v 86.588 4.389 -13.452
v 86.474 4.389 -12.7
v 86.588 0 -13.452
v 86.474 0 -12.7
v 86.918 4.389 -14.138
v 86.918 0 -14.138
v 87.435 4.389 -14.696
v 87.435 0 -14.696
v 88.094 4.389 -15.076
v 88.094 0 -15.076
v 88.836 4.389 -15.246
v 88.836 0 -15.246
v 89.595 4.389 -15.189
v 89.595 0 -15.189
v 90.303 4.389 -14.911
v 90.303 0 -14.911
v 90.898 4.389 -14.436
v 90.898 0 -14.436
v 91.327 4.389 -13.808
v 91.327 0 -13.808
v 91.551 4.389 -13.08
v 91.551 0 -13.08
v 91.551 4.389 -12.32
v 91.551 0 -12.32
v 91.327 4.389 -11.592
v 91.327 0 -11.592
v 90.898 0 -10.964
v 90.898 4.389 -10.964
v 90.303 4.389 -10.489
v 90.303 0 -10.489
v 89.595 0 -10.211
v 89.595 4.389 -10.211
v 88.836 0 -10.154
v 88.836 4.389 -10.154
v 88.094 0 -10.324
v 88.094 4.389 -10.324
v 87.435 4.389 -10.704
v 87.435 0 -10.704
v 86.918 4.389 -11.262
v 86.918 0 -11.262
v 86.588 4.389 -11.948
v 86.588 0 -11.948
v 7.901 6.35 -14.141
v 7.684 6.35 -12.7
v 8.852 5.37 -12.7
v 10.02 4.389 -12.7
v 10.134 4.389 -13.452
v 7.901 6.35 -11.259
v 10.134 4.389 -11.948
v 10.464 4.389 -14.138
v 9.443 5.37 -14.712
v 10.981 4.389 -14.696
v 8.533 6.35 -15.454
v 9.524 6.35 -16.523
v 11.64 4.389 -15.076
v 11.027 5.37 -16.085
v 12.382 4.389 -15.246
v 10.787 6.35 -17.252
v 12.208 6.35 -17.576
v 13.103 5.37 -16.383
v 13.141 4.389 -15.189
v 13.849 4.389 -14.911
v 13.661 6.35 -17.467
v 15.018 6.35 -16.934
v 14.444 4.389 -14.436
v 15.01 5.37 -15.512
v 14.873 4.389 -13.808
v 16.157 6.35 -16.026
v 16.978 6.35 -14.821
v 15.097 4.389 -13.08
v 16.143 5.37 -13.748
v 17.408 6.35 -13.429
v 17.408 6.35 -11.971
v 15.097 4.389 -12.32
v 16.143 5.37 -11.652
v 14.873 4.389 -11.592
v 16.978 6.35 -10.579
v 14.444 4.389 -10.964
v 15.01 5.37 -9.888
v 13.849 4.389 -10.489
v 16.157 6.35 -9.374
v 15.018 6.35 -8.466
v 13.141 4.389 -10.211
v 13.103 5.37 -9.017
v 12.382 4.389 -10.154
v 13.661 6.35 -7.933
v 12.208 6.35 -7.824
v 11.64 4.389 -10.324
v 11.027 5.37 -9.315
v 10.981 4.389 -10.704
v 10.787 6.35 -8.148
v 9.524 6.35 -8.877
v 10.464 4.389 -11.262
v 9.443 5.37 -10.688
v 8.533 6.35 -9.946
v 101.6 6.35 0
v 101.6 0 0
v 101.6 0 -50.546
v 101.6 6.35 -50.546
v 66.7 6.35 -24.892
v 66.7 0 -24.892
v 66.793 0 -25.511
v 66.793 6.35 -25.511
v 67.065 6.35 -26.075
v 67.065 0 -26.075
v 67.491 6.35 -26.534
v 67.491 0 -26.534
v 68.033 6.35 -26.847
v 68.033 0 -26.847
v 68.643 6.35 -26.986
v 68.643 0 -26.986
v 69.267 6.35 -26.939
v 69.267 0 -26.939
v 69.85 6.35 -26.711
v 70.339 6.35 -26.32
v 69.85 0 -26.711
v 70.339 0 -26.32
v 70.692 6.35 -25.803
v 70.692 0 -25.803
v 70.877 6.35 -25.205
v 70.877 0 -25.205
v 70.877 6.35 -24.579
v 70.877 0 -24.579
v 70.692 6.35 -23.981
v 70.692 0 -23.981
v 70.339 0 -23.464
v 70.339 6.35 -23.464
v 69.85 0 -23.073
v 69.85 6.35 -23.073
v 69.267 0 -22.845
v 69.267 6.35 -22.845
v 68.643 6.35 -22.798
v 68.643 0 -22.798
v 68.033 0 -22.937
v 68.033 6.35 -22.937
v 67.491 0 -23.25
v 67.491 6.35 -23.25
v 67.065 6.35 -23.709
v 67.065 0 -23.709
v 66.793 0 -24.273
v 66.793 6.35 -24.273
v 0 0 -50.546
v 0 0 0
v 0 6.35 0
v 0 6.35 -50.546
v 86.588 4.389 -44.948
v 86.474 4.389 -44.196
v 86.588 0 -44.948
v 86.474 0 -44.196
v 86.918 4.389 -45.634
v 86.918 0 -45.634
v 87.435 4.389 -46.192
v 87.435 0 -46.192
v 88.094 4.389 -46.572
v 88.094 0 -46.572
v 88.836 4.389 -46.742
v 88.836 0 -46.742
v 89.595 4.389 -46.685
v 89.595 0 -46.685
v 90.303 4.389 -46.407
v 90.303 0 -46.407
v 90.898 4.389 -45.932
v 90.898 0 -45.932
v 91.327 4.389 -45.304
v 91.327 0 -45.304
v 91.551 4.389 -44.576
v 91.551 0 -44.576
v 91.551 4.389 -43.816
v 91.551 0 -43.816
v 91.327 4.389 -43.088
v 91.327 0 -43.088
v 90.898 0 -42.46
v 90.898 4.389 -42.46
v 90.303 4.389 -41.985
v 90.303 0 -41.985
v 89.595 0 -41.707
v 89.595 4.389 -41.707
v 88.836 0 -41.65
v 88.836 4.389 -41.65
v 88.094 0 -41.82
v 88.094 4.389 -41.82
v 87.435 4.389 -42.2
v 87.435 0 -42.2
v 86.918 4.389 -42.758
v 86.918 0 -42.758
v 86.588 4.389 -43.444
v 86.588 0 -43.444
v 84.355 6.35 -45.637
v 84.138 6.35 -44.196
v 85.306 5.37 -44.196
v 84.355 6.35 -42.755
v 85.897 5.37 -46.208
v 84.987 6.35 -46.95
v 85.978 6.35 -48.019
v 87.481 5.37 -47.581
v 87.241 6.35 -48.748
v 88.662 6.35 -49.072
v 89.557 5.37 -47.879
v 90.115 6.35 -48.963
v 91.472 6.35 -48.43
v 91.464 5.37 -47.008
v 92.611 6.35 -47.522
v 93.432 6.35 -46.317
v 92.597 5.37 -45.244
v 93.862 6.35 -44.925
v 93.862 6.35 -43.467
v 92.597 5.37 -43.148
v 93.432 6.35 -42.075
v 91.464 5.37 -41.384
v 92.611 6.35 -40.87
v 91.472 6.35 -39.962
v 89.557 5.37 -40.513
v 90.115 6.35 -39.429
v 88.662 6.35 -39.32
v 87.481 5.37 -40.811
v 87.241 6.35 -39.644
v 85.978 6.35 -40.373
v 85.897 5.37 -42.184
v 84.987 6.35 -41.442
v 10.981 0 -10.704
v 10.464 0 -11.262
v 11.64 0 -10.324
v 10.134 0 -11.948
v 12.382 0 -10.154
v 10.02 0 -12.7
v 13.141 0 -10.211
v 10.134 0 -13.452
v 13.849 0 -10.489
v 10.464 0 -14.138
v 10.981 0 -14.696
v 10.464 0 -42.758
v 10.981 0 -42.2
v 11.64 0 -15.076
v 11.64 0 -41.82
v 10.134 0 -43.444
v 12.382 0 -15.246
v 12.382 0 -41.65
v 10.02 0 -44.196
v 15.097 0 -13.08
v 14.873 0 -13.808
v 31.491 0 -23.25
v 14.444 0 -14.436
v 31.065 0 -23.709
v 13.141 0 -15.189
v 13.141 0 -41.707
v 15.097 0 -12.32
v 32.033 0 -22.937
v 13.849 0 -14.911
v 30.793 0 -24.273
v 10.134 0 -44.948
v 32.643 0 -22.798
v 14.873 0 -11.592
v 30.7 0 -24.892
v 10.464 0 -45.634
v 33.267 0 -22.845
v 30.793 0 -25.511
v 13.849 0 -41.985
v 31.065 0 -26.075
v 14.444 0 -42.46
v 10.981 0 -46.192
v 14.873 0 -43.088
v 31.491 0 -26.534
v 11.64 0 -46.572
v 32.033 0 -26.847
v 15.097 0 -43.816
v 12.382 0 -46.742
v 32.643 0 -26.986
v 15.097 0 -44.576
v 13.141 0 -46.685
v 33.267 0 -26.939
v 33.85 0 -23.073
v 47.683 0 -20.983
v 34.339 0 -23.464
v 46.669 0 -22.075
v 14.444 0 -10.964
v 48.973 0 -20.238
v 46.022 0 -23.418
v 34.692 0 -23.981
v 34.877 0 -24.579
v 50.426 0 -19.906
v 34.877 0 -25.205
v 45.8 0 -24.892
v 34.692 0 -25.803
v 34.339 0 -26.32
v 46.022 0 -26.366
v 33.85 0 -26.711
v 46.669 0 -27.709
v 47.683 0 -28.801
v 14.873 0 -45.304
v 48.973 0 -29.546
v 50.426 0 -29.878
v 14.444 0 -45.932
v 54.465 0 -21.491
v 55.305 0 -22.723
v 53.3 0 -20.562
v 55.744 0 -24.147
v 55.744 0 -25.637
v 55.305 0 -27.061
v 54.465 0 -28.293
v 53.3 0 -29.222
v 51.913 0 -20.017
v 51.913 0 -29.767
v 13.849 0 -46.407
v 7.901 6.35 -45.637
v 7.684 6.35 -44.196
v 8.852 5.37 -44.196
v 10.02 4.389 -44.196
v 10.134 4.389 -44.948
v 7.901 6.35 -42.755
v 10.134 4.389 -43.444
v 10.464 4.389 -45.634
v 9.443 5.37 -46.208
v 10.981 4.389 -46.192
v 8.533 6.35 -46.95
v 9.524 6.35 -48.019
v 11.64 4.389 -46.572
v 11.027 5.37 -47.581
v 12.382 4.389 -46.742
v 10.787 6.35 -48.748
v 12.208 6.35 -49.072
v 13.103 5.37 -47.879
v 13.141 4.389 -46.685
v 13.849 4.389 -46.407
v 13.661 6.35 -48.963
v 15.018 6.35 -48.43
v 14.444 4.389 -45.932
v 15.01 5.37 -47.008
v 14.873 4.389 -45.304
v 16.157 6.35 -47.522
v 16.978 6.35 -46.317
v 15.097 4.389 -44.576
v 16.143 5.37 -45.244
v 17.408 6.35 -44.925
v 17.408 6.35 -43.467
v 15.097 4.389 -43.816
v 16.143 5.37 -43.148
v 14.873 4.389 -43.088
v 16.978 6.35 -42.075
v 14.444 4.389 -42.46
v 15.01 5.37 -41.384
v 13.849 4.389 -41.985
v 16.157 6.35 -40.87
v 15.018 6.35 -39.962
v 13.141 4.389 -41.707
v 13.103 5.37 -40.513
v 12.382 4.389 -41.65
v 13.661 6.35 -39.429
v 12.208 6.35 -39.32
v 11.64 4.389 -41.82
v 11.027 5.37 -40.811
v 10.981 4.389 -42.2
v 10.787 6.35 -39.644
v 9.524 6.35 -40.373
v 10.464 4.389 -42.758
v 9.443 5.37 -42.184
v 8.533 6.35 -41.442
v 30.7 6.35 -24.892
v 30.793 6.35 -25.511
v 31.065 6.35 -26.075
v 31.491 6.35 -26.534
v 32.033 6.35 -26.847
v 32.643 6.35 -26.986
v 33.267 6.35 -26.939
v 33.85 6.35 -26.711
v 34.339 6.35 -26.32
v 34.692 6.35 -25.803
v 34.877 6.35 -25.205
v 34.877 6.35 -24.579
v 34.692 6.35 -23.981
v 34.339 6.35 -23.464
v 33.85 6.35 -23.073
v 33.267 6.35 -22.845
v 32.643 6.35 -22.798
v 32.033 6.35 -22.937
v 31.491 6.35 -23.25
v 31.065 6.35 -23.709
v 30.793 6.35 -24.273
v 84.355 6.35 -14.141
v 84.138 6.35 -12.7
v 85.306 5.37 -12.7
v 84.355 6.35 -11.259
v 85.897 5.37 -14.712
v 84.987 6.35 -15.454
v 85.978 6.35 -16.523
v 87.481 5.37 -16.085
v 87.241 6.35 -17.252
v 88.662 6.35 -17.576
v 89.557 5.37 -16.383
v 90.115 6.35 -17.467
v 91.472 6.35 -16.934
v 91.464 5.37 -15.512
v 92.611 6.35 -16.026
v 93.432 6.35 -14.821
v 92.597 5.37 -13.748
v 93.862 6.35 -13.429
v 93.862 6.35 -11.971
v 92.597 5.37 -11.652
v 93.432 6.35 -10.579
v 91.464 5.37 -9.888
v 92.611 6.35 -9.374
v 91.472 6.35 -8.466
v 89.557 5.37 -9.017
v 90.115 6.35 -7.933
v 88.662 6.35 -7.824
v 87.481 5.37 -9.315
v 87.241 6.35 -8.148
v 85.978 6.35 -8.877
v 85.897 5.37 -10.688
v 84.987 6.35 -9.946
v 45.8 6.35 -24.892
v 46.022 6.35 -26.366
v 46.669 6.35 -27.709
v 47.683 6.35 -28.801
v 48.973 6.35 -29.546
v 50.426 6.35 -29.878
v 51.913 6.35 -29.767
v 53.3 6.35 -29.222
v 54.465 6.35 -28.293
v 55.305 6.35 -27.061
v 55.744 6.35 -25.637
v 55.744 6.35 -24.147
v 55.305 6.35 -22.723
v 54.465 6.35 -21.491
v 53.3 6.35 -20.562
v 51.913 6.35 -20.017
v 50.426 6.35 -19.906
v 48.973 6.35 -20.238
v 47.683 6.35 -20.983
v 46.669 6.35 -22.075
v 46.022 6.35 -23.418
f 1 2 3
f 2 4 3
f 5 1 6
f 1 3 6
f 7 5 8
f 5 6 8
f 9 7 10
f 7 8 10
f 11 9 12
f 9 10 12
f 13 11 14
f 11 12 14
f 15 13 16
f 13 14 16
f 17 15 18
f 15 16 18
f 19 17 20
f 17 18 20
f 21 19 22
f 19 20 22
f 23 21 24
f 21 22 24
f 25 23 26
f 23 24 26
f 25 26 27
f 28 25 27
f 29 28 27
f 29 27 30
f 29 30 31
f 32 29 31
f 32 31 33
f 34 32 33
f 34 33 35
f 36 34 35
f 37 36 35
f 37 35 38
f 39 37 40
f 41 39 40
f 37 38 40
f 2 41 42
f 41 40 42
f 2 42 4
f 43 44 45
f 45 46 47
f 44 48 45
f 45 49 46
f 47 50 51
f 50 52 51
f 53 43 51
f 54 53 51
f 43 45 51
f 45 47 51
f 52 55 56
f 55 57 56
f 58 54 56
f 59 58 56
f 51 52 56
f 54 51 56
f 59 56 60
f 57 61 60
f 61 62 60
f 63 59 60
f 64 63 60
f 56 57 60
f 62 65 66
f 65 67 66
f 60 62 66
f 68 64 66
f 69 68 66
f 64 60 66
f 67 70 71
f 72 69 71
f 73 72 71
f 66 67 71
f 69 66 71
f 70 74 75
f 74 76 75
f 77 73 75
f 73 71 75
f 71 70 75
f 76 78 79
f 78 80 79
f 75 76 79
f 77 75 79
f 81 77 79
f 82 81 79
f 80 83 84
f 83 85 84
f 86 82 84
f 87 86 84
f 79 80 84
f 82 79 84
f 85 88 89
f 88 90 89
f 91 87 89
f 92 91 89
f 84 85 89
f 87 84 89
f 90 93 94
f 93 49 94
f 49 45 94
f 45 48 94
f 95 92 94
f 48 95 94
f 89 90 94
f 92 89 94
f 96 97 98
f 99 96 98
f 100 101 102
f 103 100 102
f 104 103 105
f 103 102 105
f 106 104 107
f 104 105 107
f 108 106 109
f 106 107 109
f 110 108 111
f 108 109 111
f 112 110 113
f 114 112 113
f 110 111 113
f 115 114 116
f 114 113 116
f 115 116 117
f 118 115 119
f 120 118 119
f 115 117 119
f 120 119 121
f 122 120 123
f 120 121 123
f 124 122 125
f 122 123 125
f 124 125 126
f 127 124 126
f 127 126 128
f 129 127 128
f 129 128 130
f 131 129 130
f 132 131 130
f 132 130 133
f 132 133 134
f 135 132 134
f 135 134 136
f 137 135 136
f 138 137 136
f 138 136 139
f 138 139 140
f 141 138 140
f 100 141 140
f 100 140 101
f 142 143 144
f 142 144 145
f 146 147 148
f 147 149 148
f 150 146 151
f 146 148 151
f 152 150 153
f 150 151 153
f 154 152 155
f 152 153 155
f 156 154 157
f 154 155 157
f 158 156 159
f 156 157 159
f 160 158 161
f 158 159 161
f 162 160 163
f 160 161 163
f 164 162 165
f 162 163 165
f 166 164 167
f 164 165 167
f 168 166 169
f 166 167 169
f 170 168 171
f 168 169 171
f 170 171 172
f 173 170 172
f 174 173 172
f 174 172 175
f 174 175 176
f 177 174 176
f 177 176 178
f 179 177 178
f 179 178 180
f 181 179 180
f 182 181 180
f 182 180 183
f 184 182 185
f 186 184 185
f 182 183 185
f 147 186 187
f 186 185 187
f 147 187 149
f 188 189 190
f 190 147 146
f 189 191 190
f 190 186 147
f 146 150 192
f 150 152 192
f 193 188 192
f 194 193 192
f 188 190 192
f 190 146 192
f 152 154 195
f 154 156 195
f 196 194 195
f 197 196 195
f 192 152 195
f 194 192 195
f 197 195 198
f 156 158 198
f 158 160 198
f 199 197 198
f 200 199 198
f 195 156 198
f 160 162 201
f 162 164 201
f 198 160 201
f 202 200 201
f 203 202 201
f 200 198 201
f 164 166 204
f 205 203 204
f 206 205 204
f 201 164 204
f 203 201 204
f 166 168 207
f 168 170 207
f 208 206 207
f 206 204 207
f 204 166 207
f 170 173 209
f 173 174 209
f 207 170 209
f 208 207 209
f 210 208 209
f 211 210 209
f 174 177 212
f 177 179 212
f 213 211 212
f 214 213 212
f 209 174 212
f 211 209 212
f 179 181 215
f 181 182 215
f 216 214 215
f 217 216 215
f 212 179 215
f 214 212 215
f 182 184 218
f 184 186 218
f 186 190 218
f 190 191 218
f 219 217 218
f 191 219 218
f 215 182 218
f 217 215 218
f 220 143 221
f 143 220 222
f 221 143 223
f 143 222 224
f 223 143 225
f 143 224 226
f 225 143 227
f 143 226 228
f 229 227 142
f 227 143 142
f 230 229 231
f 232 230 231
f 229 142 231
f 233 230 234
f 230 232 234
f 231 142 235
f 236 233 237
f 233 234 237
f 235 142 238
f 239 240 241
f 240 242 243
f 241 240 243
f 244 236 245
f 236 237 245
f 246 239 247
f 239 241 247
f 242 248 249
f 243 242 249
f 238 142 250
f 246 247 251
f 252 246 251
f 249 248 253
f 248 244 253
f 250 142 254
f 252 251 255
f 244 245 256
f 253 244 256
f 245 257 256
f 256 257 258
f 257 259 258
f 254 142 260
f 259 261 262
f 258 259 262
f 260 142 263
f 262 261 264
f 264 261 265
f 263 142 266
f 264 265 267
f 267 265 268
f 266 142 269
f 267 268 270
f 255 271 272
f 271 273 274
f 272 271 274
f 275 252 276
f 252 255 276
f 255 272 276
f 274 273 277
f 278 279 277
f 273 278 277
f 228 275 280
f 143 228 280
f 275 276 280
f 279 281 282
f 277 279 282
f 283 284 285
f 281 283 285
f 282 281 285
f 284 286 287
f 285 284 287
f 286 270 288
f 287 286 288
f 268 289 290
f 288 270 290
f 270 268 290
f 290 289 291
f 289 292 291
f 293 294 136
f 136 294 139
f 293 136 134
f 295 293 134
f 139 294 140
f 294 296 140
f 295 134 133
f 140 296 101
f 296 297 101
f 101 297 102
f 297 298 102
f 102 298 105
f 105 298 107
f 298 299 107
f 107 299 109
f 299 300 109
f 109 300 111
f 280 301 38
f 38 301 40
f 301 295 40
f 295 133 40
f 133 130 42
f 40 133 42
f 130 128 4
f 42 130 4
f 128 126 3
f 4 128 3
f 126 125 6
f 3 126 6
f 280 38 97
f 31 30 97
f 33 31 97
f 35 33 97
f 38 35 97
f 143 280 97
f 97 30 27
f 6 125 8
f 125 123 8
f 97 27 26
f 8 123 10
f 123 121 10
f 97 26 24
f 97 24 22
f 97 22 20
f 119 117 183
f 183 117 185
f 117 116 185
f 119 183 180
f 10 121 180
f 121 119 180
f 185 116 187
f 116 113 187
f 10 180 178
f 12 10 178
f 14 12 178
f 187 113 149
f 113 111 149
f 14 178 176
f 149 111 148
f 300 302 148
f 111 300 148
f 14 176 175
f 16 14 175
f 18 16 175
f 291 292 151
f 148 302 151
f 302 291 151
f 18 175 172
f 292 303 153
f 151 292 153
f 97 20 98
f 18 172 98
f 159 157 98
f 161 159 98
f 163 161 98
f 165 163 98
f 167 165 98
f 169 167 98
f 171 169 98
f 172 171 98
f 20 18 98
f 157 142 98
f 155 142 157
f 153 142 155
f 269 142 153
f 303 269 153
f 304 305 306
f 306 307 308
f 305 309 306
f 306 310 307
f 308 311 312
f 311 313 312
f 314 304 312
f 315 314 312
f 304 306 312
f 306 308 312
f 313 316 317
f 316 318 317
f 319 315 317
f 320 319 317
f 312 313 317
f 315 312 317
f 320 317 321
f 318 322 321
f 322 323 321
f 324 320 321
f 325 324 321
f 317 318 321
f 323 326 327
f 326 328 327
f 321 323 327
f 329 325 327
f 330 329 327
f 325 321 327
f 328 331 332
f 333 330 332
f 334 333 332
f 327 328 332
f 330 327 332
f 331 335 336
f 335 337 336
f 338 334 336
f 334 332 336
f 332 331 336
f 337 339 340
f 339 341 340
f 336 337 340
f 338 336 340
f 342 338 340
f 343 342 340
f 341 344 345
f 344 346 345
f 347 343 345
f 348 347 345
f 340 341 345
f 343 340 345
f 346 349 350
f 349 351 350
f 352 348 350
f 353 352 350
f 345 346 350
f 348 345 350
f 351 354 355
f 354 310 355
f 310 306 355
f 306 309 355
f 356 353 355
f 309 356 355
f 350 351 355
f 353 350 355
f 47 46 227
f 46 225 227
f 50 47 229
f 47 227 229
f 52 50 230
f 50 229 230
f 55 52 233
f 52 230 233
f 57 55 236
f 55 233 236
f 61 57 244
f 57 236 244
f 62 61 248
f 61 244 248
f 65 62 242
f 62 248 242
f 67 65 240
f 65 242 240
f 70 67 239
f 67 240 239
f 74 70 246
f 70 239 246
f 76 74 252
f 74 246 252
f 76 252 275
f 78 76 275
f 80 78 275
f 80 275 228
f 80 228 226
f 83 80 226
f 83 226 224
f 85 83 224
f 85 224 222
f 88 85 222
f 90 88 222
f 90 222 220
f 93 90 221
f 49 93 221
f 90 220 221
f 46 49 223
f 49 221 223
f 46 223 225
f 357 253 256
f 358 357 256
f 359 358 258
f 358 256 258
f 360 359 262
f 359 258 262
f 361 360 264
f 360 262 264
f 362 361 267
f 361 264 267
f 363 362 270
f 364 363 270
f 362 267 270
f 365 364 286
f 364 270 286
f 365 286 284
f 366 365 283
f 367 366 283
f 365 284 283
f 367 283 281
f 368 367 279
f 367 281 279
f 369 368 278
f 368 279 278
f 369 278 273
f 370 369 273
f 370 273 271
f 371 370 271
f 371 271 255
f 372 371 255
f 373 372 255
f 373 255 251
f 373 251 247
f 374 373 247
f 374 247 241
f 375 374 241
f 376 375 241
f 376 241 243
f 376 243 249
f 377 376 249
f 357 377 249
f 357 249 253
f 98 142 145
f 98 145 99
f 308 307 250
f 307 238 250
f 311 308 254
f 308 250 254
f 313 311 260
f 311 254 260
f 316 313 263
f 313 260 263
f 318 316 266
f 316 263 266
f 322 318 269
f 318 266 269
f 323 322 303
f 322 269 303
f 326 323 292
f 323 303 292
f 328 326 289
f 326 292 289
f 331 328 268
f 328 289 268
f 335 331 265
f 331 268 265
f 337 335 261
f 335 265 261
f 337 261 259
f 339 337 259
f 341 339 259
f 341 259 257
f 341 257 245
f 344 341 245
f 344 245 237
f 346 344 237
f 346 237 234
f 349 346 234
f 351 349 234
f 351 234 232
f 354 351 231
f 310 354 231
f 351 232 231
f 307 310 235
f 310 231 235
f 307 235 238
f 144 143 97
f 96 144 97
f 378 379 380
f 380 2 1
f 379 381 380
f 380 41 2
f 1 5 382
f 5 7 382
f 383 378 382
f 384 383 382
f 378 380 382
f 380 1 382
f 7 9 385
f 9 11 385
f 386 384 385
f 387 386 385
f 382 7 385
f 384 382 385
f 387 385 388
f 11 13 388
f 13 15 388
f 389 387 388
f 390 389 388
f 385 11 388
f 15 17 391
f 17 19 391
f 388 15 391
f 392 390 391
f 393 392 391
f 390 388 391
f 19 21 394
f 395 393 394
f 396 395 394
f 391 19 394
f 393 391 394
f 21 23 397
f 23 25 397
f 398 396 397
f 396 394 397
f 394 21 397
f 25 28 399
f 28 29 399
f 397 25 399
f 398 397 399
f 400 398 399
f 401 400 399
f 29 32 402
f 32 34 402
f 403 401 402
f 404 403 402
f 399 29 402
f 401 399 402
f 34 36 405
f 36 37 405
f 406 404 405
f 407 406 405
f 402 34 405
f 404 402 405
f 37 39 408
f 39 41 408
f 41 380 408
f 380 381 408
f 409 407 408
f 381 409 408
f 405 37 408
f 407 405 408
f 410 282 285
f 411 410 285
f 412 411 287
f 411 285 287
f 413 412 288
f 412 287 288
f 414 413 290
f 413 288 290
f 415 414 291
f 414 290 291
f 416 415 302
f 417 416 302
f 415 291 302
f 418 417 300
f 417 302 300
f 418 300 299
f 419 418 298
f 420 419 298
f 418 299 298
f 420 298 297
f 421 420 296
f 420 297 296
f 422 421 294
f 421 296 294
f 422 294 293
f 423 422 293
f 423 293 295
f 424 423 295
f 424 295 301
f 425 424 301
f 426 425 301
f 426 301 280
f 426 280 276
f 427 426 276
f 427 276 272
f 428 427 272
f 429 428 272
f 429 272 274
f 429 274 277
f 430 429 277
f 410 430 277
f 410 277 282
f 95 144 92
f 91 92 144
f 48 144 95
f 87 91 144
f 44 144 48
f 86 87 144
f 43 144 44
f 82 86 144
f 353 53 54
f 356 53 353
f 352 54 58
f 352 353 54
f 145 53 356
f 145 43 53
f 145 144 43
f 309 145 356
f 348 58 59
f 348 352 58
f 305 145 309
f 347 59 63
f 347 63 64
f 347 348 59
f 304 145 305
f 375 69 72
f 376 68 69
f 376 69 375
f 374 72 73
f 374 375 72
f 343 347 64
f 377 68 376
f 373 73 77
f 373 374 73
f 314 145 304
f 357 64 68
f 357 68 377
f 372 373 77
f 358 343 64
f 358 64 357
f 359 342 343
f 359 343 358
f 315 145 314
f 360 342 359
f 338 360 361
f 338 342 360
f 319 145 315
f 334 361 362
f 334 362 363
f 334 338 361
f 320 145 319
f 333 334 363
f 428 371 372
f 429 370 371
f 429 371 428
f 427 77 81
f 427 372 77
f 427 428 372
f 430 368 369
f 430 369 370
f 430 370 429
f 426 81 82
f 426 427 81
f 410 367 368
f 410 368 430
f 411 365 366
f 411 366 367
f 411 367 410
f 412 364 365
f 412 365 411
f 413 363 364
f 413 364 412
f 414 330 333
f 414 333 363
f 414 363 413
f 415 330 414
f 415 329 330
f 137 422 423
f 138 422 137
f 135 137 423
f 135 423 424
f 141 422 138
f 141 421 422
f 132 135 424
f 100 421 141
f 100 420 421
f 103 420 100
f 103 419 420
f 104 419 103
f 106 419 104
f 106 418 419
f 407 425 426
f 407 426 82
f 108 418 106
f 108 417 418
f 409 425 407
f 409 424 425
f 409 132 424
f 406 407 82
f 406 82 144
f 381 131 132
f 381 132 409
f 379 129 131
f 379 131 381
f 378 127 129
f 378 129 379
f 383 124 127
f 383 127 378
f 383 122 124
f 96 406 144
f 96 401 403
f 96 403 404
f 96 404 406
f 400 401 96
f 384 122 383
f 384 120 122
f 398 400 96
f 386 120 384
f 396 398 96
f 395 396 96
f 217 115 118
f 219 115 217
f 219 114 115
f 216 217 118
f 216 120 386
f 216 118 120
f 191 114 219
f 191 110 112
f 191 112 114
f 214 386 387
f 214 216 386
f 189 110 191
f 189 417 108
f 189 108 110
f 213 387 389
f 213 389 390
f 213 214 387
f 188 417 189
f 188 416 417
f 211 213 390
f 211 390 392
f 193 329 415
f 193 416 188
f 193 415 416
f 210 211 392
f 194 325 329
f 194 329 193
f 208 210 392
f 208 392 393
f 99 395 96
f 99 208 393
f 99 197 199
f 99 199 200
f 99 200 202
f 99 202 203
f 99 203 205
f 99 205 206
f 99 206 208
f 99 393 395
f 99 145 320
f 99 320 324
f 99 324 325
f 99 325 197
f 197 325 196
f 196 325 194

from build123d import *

# Parameters (mm, degrees)
SKETCH1_W                                            = 101.6
SKETCH1_H                                            = 50.546
BASE_DEPTH                                           = 6.35
BEARING_BLOCK_BOLT_HOLE_PATTERN_D                    = 4.2
SHAFT_CLEARANCE_HOLE_D                               = 10
PLATE_MOUNTING_WOOD_SCREW_CLEARANCE_HOLE_D           = 5.1054
PLATE_MOUNTING_WOOD_SCREW_CLEARANCE_HOLE_CSINK_D     = 9.779
PLATE_MOUNTING_WOOD_SCREW_CLEARANCE_HOLE_CSINK_ANGLE = 100


with BuildPart() as part:
    # Sketch1 → base (new body)
    with BuildSketch(Plane(origin=(0, 0, 0), x_dir=(1, 0, 0), z_dir=(0, 1, 0))):
        with Locations((50.8, 25.273)):
            Rectangle(SKETCH1_W, SKETCH1_H)
    extrude(amount=BASE_DEPTH)

    # bearing_block_bolt_hole_pattern (through all)
    with Locations(Plane(origin=(0, 6.35, 0), x_dir=(1, 0, 0), z_dir=(0, 1, 0))):
        with Locations((32.800036, 24.892), (68.799964, 24.892)):
            Hole(BEARING_BLOCK_BOLT_HOLE_PATTERN_D / 2)

    # shaft_clearance_hole (through all)
    with Locations(Plane(origin=(0, 6.35, 0), x_dir=(1, 0, 0), z_dir=(0, 1, 0))):
        with Locations((50.8, 24.892)):
            Hole(SHAFT_CLEARANCE_HOLE_D / 2)

    # plate_mounting_wood_screw_clearance_holes (through all)
    with Locations(Plane(origin=(0, 6.35, 0), x_dir=(1, 0, 0), z_dir=(0, 1, 0))):
        with Locations((12.573, 44.196), (89.027, 12.7), (12.573, 12.7), (89.027, 44.196)):
            CounterSinkHole(PLATE_MOUNTING_WOOD_SCREW_CLEARANCE_HOLE_D / 2, PLATE_MOUNTING_WOOD_SCREW_CLEARANCE_HOLE_CSINK_D / 2, counter_sink_angle=PLATE_MOUNTING_WOOD_SCREW_CLEARANCE_HOLE_CSINK_ANGLE)


solid = part.part
